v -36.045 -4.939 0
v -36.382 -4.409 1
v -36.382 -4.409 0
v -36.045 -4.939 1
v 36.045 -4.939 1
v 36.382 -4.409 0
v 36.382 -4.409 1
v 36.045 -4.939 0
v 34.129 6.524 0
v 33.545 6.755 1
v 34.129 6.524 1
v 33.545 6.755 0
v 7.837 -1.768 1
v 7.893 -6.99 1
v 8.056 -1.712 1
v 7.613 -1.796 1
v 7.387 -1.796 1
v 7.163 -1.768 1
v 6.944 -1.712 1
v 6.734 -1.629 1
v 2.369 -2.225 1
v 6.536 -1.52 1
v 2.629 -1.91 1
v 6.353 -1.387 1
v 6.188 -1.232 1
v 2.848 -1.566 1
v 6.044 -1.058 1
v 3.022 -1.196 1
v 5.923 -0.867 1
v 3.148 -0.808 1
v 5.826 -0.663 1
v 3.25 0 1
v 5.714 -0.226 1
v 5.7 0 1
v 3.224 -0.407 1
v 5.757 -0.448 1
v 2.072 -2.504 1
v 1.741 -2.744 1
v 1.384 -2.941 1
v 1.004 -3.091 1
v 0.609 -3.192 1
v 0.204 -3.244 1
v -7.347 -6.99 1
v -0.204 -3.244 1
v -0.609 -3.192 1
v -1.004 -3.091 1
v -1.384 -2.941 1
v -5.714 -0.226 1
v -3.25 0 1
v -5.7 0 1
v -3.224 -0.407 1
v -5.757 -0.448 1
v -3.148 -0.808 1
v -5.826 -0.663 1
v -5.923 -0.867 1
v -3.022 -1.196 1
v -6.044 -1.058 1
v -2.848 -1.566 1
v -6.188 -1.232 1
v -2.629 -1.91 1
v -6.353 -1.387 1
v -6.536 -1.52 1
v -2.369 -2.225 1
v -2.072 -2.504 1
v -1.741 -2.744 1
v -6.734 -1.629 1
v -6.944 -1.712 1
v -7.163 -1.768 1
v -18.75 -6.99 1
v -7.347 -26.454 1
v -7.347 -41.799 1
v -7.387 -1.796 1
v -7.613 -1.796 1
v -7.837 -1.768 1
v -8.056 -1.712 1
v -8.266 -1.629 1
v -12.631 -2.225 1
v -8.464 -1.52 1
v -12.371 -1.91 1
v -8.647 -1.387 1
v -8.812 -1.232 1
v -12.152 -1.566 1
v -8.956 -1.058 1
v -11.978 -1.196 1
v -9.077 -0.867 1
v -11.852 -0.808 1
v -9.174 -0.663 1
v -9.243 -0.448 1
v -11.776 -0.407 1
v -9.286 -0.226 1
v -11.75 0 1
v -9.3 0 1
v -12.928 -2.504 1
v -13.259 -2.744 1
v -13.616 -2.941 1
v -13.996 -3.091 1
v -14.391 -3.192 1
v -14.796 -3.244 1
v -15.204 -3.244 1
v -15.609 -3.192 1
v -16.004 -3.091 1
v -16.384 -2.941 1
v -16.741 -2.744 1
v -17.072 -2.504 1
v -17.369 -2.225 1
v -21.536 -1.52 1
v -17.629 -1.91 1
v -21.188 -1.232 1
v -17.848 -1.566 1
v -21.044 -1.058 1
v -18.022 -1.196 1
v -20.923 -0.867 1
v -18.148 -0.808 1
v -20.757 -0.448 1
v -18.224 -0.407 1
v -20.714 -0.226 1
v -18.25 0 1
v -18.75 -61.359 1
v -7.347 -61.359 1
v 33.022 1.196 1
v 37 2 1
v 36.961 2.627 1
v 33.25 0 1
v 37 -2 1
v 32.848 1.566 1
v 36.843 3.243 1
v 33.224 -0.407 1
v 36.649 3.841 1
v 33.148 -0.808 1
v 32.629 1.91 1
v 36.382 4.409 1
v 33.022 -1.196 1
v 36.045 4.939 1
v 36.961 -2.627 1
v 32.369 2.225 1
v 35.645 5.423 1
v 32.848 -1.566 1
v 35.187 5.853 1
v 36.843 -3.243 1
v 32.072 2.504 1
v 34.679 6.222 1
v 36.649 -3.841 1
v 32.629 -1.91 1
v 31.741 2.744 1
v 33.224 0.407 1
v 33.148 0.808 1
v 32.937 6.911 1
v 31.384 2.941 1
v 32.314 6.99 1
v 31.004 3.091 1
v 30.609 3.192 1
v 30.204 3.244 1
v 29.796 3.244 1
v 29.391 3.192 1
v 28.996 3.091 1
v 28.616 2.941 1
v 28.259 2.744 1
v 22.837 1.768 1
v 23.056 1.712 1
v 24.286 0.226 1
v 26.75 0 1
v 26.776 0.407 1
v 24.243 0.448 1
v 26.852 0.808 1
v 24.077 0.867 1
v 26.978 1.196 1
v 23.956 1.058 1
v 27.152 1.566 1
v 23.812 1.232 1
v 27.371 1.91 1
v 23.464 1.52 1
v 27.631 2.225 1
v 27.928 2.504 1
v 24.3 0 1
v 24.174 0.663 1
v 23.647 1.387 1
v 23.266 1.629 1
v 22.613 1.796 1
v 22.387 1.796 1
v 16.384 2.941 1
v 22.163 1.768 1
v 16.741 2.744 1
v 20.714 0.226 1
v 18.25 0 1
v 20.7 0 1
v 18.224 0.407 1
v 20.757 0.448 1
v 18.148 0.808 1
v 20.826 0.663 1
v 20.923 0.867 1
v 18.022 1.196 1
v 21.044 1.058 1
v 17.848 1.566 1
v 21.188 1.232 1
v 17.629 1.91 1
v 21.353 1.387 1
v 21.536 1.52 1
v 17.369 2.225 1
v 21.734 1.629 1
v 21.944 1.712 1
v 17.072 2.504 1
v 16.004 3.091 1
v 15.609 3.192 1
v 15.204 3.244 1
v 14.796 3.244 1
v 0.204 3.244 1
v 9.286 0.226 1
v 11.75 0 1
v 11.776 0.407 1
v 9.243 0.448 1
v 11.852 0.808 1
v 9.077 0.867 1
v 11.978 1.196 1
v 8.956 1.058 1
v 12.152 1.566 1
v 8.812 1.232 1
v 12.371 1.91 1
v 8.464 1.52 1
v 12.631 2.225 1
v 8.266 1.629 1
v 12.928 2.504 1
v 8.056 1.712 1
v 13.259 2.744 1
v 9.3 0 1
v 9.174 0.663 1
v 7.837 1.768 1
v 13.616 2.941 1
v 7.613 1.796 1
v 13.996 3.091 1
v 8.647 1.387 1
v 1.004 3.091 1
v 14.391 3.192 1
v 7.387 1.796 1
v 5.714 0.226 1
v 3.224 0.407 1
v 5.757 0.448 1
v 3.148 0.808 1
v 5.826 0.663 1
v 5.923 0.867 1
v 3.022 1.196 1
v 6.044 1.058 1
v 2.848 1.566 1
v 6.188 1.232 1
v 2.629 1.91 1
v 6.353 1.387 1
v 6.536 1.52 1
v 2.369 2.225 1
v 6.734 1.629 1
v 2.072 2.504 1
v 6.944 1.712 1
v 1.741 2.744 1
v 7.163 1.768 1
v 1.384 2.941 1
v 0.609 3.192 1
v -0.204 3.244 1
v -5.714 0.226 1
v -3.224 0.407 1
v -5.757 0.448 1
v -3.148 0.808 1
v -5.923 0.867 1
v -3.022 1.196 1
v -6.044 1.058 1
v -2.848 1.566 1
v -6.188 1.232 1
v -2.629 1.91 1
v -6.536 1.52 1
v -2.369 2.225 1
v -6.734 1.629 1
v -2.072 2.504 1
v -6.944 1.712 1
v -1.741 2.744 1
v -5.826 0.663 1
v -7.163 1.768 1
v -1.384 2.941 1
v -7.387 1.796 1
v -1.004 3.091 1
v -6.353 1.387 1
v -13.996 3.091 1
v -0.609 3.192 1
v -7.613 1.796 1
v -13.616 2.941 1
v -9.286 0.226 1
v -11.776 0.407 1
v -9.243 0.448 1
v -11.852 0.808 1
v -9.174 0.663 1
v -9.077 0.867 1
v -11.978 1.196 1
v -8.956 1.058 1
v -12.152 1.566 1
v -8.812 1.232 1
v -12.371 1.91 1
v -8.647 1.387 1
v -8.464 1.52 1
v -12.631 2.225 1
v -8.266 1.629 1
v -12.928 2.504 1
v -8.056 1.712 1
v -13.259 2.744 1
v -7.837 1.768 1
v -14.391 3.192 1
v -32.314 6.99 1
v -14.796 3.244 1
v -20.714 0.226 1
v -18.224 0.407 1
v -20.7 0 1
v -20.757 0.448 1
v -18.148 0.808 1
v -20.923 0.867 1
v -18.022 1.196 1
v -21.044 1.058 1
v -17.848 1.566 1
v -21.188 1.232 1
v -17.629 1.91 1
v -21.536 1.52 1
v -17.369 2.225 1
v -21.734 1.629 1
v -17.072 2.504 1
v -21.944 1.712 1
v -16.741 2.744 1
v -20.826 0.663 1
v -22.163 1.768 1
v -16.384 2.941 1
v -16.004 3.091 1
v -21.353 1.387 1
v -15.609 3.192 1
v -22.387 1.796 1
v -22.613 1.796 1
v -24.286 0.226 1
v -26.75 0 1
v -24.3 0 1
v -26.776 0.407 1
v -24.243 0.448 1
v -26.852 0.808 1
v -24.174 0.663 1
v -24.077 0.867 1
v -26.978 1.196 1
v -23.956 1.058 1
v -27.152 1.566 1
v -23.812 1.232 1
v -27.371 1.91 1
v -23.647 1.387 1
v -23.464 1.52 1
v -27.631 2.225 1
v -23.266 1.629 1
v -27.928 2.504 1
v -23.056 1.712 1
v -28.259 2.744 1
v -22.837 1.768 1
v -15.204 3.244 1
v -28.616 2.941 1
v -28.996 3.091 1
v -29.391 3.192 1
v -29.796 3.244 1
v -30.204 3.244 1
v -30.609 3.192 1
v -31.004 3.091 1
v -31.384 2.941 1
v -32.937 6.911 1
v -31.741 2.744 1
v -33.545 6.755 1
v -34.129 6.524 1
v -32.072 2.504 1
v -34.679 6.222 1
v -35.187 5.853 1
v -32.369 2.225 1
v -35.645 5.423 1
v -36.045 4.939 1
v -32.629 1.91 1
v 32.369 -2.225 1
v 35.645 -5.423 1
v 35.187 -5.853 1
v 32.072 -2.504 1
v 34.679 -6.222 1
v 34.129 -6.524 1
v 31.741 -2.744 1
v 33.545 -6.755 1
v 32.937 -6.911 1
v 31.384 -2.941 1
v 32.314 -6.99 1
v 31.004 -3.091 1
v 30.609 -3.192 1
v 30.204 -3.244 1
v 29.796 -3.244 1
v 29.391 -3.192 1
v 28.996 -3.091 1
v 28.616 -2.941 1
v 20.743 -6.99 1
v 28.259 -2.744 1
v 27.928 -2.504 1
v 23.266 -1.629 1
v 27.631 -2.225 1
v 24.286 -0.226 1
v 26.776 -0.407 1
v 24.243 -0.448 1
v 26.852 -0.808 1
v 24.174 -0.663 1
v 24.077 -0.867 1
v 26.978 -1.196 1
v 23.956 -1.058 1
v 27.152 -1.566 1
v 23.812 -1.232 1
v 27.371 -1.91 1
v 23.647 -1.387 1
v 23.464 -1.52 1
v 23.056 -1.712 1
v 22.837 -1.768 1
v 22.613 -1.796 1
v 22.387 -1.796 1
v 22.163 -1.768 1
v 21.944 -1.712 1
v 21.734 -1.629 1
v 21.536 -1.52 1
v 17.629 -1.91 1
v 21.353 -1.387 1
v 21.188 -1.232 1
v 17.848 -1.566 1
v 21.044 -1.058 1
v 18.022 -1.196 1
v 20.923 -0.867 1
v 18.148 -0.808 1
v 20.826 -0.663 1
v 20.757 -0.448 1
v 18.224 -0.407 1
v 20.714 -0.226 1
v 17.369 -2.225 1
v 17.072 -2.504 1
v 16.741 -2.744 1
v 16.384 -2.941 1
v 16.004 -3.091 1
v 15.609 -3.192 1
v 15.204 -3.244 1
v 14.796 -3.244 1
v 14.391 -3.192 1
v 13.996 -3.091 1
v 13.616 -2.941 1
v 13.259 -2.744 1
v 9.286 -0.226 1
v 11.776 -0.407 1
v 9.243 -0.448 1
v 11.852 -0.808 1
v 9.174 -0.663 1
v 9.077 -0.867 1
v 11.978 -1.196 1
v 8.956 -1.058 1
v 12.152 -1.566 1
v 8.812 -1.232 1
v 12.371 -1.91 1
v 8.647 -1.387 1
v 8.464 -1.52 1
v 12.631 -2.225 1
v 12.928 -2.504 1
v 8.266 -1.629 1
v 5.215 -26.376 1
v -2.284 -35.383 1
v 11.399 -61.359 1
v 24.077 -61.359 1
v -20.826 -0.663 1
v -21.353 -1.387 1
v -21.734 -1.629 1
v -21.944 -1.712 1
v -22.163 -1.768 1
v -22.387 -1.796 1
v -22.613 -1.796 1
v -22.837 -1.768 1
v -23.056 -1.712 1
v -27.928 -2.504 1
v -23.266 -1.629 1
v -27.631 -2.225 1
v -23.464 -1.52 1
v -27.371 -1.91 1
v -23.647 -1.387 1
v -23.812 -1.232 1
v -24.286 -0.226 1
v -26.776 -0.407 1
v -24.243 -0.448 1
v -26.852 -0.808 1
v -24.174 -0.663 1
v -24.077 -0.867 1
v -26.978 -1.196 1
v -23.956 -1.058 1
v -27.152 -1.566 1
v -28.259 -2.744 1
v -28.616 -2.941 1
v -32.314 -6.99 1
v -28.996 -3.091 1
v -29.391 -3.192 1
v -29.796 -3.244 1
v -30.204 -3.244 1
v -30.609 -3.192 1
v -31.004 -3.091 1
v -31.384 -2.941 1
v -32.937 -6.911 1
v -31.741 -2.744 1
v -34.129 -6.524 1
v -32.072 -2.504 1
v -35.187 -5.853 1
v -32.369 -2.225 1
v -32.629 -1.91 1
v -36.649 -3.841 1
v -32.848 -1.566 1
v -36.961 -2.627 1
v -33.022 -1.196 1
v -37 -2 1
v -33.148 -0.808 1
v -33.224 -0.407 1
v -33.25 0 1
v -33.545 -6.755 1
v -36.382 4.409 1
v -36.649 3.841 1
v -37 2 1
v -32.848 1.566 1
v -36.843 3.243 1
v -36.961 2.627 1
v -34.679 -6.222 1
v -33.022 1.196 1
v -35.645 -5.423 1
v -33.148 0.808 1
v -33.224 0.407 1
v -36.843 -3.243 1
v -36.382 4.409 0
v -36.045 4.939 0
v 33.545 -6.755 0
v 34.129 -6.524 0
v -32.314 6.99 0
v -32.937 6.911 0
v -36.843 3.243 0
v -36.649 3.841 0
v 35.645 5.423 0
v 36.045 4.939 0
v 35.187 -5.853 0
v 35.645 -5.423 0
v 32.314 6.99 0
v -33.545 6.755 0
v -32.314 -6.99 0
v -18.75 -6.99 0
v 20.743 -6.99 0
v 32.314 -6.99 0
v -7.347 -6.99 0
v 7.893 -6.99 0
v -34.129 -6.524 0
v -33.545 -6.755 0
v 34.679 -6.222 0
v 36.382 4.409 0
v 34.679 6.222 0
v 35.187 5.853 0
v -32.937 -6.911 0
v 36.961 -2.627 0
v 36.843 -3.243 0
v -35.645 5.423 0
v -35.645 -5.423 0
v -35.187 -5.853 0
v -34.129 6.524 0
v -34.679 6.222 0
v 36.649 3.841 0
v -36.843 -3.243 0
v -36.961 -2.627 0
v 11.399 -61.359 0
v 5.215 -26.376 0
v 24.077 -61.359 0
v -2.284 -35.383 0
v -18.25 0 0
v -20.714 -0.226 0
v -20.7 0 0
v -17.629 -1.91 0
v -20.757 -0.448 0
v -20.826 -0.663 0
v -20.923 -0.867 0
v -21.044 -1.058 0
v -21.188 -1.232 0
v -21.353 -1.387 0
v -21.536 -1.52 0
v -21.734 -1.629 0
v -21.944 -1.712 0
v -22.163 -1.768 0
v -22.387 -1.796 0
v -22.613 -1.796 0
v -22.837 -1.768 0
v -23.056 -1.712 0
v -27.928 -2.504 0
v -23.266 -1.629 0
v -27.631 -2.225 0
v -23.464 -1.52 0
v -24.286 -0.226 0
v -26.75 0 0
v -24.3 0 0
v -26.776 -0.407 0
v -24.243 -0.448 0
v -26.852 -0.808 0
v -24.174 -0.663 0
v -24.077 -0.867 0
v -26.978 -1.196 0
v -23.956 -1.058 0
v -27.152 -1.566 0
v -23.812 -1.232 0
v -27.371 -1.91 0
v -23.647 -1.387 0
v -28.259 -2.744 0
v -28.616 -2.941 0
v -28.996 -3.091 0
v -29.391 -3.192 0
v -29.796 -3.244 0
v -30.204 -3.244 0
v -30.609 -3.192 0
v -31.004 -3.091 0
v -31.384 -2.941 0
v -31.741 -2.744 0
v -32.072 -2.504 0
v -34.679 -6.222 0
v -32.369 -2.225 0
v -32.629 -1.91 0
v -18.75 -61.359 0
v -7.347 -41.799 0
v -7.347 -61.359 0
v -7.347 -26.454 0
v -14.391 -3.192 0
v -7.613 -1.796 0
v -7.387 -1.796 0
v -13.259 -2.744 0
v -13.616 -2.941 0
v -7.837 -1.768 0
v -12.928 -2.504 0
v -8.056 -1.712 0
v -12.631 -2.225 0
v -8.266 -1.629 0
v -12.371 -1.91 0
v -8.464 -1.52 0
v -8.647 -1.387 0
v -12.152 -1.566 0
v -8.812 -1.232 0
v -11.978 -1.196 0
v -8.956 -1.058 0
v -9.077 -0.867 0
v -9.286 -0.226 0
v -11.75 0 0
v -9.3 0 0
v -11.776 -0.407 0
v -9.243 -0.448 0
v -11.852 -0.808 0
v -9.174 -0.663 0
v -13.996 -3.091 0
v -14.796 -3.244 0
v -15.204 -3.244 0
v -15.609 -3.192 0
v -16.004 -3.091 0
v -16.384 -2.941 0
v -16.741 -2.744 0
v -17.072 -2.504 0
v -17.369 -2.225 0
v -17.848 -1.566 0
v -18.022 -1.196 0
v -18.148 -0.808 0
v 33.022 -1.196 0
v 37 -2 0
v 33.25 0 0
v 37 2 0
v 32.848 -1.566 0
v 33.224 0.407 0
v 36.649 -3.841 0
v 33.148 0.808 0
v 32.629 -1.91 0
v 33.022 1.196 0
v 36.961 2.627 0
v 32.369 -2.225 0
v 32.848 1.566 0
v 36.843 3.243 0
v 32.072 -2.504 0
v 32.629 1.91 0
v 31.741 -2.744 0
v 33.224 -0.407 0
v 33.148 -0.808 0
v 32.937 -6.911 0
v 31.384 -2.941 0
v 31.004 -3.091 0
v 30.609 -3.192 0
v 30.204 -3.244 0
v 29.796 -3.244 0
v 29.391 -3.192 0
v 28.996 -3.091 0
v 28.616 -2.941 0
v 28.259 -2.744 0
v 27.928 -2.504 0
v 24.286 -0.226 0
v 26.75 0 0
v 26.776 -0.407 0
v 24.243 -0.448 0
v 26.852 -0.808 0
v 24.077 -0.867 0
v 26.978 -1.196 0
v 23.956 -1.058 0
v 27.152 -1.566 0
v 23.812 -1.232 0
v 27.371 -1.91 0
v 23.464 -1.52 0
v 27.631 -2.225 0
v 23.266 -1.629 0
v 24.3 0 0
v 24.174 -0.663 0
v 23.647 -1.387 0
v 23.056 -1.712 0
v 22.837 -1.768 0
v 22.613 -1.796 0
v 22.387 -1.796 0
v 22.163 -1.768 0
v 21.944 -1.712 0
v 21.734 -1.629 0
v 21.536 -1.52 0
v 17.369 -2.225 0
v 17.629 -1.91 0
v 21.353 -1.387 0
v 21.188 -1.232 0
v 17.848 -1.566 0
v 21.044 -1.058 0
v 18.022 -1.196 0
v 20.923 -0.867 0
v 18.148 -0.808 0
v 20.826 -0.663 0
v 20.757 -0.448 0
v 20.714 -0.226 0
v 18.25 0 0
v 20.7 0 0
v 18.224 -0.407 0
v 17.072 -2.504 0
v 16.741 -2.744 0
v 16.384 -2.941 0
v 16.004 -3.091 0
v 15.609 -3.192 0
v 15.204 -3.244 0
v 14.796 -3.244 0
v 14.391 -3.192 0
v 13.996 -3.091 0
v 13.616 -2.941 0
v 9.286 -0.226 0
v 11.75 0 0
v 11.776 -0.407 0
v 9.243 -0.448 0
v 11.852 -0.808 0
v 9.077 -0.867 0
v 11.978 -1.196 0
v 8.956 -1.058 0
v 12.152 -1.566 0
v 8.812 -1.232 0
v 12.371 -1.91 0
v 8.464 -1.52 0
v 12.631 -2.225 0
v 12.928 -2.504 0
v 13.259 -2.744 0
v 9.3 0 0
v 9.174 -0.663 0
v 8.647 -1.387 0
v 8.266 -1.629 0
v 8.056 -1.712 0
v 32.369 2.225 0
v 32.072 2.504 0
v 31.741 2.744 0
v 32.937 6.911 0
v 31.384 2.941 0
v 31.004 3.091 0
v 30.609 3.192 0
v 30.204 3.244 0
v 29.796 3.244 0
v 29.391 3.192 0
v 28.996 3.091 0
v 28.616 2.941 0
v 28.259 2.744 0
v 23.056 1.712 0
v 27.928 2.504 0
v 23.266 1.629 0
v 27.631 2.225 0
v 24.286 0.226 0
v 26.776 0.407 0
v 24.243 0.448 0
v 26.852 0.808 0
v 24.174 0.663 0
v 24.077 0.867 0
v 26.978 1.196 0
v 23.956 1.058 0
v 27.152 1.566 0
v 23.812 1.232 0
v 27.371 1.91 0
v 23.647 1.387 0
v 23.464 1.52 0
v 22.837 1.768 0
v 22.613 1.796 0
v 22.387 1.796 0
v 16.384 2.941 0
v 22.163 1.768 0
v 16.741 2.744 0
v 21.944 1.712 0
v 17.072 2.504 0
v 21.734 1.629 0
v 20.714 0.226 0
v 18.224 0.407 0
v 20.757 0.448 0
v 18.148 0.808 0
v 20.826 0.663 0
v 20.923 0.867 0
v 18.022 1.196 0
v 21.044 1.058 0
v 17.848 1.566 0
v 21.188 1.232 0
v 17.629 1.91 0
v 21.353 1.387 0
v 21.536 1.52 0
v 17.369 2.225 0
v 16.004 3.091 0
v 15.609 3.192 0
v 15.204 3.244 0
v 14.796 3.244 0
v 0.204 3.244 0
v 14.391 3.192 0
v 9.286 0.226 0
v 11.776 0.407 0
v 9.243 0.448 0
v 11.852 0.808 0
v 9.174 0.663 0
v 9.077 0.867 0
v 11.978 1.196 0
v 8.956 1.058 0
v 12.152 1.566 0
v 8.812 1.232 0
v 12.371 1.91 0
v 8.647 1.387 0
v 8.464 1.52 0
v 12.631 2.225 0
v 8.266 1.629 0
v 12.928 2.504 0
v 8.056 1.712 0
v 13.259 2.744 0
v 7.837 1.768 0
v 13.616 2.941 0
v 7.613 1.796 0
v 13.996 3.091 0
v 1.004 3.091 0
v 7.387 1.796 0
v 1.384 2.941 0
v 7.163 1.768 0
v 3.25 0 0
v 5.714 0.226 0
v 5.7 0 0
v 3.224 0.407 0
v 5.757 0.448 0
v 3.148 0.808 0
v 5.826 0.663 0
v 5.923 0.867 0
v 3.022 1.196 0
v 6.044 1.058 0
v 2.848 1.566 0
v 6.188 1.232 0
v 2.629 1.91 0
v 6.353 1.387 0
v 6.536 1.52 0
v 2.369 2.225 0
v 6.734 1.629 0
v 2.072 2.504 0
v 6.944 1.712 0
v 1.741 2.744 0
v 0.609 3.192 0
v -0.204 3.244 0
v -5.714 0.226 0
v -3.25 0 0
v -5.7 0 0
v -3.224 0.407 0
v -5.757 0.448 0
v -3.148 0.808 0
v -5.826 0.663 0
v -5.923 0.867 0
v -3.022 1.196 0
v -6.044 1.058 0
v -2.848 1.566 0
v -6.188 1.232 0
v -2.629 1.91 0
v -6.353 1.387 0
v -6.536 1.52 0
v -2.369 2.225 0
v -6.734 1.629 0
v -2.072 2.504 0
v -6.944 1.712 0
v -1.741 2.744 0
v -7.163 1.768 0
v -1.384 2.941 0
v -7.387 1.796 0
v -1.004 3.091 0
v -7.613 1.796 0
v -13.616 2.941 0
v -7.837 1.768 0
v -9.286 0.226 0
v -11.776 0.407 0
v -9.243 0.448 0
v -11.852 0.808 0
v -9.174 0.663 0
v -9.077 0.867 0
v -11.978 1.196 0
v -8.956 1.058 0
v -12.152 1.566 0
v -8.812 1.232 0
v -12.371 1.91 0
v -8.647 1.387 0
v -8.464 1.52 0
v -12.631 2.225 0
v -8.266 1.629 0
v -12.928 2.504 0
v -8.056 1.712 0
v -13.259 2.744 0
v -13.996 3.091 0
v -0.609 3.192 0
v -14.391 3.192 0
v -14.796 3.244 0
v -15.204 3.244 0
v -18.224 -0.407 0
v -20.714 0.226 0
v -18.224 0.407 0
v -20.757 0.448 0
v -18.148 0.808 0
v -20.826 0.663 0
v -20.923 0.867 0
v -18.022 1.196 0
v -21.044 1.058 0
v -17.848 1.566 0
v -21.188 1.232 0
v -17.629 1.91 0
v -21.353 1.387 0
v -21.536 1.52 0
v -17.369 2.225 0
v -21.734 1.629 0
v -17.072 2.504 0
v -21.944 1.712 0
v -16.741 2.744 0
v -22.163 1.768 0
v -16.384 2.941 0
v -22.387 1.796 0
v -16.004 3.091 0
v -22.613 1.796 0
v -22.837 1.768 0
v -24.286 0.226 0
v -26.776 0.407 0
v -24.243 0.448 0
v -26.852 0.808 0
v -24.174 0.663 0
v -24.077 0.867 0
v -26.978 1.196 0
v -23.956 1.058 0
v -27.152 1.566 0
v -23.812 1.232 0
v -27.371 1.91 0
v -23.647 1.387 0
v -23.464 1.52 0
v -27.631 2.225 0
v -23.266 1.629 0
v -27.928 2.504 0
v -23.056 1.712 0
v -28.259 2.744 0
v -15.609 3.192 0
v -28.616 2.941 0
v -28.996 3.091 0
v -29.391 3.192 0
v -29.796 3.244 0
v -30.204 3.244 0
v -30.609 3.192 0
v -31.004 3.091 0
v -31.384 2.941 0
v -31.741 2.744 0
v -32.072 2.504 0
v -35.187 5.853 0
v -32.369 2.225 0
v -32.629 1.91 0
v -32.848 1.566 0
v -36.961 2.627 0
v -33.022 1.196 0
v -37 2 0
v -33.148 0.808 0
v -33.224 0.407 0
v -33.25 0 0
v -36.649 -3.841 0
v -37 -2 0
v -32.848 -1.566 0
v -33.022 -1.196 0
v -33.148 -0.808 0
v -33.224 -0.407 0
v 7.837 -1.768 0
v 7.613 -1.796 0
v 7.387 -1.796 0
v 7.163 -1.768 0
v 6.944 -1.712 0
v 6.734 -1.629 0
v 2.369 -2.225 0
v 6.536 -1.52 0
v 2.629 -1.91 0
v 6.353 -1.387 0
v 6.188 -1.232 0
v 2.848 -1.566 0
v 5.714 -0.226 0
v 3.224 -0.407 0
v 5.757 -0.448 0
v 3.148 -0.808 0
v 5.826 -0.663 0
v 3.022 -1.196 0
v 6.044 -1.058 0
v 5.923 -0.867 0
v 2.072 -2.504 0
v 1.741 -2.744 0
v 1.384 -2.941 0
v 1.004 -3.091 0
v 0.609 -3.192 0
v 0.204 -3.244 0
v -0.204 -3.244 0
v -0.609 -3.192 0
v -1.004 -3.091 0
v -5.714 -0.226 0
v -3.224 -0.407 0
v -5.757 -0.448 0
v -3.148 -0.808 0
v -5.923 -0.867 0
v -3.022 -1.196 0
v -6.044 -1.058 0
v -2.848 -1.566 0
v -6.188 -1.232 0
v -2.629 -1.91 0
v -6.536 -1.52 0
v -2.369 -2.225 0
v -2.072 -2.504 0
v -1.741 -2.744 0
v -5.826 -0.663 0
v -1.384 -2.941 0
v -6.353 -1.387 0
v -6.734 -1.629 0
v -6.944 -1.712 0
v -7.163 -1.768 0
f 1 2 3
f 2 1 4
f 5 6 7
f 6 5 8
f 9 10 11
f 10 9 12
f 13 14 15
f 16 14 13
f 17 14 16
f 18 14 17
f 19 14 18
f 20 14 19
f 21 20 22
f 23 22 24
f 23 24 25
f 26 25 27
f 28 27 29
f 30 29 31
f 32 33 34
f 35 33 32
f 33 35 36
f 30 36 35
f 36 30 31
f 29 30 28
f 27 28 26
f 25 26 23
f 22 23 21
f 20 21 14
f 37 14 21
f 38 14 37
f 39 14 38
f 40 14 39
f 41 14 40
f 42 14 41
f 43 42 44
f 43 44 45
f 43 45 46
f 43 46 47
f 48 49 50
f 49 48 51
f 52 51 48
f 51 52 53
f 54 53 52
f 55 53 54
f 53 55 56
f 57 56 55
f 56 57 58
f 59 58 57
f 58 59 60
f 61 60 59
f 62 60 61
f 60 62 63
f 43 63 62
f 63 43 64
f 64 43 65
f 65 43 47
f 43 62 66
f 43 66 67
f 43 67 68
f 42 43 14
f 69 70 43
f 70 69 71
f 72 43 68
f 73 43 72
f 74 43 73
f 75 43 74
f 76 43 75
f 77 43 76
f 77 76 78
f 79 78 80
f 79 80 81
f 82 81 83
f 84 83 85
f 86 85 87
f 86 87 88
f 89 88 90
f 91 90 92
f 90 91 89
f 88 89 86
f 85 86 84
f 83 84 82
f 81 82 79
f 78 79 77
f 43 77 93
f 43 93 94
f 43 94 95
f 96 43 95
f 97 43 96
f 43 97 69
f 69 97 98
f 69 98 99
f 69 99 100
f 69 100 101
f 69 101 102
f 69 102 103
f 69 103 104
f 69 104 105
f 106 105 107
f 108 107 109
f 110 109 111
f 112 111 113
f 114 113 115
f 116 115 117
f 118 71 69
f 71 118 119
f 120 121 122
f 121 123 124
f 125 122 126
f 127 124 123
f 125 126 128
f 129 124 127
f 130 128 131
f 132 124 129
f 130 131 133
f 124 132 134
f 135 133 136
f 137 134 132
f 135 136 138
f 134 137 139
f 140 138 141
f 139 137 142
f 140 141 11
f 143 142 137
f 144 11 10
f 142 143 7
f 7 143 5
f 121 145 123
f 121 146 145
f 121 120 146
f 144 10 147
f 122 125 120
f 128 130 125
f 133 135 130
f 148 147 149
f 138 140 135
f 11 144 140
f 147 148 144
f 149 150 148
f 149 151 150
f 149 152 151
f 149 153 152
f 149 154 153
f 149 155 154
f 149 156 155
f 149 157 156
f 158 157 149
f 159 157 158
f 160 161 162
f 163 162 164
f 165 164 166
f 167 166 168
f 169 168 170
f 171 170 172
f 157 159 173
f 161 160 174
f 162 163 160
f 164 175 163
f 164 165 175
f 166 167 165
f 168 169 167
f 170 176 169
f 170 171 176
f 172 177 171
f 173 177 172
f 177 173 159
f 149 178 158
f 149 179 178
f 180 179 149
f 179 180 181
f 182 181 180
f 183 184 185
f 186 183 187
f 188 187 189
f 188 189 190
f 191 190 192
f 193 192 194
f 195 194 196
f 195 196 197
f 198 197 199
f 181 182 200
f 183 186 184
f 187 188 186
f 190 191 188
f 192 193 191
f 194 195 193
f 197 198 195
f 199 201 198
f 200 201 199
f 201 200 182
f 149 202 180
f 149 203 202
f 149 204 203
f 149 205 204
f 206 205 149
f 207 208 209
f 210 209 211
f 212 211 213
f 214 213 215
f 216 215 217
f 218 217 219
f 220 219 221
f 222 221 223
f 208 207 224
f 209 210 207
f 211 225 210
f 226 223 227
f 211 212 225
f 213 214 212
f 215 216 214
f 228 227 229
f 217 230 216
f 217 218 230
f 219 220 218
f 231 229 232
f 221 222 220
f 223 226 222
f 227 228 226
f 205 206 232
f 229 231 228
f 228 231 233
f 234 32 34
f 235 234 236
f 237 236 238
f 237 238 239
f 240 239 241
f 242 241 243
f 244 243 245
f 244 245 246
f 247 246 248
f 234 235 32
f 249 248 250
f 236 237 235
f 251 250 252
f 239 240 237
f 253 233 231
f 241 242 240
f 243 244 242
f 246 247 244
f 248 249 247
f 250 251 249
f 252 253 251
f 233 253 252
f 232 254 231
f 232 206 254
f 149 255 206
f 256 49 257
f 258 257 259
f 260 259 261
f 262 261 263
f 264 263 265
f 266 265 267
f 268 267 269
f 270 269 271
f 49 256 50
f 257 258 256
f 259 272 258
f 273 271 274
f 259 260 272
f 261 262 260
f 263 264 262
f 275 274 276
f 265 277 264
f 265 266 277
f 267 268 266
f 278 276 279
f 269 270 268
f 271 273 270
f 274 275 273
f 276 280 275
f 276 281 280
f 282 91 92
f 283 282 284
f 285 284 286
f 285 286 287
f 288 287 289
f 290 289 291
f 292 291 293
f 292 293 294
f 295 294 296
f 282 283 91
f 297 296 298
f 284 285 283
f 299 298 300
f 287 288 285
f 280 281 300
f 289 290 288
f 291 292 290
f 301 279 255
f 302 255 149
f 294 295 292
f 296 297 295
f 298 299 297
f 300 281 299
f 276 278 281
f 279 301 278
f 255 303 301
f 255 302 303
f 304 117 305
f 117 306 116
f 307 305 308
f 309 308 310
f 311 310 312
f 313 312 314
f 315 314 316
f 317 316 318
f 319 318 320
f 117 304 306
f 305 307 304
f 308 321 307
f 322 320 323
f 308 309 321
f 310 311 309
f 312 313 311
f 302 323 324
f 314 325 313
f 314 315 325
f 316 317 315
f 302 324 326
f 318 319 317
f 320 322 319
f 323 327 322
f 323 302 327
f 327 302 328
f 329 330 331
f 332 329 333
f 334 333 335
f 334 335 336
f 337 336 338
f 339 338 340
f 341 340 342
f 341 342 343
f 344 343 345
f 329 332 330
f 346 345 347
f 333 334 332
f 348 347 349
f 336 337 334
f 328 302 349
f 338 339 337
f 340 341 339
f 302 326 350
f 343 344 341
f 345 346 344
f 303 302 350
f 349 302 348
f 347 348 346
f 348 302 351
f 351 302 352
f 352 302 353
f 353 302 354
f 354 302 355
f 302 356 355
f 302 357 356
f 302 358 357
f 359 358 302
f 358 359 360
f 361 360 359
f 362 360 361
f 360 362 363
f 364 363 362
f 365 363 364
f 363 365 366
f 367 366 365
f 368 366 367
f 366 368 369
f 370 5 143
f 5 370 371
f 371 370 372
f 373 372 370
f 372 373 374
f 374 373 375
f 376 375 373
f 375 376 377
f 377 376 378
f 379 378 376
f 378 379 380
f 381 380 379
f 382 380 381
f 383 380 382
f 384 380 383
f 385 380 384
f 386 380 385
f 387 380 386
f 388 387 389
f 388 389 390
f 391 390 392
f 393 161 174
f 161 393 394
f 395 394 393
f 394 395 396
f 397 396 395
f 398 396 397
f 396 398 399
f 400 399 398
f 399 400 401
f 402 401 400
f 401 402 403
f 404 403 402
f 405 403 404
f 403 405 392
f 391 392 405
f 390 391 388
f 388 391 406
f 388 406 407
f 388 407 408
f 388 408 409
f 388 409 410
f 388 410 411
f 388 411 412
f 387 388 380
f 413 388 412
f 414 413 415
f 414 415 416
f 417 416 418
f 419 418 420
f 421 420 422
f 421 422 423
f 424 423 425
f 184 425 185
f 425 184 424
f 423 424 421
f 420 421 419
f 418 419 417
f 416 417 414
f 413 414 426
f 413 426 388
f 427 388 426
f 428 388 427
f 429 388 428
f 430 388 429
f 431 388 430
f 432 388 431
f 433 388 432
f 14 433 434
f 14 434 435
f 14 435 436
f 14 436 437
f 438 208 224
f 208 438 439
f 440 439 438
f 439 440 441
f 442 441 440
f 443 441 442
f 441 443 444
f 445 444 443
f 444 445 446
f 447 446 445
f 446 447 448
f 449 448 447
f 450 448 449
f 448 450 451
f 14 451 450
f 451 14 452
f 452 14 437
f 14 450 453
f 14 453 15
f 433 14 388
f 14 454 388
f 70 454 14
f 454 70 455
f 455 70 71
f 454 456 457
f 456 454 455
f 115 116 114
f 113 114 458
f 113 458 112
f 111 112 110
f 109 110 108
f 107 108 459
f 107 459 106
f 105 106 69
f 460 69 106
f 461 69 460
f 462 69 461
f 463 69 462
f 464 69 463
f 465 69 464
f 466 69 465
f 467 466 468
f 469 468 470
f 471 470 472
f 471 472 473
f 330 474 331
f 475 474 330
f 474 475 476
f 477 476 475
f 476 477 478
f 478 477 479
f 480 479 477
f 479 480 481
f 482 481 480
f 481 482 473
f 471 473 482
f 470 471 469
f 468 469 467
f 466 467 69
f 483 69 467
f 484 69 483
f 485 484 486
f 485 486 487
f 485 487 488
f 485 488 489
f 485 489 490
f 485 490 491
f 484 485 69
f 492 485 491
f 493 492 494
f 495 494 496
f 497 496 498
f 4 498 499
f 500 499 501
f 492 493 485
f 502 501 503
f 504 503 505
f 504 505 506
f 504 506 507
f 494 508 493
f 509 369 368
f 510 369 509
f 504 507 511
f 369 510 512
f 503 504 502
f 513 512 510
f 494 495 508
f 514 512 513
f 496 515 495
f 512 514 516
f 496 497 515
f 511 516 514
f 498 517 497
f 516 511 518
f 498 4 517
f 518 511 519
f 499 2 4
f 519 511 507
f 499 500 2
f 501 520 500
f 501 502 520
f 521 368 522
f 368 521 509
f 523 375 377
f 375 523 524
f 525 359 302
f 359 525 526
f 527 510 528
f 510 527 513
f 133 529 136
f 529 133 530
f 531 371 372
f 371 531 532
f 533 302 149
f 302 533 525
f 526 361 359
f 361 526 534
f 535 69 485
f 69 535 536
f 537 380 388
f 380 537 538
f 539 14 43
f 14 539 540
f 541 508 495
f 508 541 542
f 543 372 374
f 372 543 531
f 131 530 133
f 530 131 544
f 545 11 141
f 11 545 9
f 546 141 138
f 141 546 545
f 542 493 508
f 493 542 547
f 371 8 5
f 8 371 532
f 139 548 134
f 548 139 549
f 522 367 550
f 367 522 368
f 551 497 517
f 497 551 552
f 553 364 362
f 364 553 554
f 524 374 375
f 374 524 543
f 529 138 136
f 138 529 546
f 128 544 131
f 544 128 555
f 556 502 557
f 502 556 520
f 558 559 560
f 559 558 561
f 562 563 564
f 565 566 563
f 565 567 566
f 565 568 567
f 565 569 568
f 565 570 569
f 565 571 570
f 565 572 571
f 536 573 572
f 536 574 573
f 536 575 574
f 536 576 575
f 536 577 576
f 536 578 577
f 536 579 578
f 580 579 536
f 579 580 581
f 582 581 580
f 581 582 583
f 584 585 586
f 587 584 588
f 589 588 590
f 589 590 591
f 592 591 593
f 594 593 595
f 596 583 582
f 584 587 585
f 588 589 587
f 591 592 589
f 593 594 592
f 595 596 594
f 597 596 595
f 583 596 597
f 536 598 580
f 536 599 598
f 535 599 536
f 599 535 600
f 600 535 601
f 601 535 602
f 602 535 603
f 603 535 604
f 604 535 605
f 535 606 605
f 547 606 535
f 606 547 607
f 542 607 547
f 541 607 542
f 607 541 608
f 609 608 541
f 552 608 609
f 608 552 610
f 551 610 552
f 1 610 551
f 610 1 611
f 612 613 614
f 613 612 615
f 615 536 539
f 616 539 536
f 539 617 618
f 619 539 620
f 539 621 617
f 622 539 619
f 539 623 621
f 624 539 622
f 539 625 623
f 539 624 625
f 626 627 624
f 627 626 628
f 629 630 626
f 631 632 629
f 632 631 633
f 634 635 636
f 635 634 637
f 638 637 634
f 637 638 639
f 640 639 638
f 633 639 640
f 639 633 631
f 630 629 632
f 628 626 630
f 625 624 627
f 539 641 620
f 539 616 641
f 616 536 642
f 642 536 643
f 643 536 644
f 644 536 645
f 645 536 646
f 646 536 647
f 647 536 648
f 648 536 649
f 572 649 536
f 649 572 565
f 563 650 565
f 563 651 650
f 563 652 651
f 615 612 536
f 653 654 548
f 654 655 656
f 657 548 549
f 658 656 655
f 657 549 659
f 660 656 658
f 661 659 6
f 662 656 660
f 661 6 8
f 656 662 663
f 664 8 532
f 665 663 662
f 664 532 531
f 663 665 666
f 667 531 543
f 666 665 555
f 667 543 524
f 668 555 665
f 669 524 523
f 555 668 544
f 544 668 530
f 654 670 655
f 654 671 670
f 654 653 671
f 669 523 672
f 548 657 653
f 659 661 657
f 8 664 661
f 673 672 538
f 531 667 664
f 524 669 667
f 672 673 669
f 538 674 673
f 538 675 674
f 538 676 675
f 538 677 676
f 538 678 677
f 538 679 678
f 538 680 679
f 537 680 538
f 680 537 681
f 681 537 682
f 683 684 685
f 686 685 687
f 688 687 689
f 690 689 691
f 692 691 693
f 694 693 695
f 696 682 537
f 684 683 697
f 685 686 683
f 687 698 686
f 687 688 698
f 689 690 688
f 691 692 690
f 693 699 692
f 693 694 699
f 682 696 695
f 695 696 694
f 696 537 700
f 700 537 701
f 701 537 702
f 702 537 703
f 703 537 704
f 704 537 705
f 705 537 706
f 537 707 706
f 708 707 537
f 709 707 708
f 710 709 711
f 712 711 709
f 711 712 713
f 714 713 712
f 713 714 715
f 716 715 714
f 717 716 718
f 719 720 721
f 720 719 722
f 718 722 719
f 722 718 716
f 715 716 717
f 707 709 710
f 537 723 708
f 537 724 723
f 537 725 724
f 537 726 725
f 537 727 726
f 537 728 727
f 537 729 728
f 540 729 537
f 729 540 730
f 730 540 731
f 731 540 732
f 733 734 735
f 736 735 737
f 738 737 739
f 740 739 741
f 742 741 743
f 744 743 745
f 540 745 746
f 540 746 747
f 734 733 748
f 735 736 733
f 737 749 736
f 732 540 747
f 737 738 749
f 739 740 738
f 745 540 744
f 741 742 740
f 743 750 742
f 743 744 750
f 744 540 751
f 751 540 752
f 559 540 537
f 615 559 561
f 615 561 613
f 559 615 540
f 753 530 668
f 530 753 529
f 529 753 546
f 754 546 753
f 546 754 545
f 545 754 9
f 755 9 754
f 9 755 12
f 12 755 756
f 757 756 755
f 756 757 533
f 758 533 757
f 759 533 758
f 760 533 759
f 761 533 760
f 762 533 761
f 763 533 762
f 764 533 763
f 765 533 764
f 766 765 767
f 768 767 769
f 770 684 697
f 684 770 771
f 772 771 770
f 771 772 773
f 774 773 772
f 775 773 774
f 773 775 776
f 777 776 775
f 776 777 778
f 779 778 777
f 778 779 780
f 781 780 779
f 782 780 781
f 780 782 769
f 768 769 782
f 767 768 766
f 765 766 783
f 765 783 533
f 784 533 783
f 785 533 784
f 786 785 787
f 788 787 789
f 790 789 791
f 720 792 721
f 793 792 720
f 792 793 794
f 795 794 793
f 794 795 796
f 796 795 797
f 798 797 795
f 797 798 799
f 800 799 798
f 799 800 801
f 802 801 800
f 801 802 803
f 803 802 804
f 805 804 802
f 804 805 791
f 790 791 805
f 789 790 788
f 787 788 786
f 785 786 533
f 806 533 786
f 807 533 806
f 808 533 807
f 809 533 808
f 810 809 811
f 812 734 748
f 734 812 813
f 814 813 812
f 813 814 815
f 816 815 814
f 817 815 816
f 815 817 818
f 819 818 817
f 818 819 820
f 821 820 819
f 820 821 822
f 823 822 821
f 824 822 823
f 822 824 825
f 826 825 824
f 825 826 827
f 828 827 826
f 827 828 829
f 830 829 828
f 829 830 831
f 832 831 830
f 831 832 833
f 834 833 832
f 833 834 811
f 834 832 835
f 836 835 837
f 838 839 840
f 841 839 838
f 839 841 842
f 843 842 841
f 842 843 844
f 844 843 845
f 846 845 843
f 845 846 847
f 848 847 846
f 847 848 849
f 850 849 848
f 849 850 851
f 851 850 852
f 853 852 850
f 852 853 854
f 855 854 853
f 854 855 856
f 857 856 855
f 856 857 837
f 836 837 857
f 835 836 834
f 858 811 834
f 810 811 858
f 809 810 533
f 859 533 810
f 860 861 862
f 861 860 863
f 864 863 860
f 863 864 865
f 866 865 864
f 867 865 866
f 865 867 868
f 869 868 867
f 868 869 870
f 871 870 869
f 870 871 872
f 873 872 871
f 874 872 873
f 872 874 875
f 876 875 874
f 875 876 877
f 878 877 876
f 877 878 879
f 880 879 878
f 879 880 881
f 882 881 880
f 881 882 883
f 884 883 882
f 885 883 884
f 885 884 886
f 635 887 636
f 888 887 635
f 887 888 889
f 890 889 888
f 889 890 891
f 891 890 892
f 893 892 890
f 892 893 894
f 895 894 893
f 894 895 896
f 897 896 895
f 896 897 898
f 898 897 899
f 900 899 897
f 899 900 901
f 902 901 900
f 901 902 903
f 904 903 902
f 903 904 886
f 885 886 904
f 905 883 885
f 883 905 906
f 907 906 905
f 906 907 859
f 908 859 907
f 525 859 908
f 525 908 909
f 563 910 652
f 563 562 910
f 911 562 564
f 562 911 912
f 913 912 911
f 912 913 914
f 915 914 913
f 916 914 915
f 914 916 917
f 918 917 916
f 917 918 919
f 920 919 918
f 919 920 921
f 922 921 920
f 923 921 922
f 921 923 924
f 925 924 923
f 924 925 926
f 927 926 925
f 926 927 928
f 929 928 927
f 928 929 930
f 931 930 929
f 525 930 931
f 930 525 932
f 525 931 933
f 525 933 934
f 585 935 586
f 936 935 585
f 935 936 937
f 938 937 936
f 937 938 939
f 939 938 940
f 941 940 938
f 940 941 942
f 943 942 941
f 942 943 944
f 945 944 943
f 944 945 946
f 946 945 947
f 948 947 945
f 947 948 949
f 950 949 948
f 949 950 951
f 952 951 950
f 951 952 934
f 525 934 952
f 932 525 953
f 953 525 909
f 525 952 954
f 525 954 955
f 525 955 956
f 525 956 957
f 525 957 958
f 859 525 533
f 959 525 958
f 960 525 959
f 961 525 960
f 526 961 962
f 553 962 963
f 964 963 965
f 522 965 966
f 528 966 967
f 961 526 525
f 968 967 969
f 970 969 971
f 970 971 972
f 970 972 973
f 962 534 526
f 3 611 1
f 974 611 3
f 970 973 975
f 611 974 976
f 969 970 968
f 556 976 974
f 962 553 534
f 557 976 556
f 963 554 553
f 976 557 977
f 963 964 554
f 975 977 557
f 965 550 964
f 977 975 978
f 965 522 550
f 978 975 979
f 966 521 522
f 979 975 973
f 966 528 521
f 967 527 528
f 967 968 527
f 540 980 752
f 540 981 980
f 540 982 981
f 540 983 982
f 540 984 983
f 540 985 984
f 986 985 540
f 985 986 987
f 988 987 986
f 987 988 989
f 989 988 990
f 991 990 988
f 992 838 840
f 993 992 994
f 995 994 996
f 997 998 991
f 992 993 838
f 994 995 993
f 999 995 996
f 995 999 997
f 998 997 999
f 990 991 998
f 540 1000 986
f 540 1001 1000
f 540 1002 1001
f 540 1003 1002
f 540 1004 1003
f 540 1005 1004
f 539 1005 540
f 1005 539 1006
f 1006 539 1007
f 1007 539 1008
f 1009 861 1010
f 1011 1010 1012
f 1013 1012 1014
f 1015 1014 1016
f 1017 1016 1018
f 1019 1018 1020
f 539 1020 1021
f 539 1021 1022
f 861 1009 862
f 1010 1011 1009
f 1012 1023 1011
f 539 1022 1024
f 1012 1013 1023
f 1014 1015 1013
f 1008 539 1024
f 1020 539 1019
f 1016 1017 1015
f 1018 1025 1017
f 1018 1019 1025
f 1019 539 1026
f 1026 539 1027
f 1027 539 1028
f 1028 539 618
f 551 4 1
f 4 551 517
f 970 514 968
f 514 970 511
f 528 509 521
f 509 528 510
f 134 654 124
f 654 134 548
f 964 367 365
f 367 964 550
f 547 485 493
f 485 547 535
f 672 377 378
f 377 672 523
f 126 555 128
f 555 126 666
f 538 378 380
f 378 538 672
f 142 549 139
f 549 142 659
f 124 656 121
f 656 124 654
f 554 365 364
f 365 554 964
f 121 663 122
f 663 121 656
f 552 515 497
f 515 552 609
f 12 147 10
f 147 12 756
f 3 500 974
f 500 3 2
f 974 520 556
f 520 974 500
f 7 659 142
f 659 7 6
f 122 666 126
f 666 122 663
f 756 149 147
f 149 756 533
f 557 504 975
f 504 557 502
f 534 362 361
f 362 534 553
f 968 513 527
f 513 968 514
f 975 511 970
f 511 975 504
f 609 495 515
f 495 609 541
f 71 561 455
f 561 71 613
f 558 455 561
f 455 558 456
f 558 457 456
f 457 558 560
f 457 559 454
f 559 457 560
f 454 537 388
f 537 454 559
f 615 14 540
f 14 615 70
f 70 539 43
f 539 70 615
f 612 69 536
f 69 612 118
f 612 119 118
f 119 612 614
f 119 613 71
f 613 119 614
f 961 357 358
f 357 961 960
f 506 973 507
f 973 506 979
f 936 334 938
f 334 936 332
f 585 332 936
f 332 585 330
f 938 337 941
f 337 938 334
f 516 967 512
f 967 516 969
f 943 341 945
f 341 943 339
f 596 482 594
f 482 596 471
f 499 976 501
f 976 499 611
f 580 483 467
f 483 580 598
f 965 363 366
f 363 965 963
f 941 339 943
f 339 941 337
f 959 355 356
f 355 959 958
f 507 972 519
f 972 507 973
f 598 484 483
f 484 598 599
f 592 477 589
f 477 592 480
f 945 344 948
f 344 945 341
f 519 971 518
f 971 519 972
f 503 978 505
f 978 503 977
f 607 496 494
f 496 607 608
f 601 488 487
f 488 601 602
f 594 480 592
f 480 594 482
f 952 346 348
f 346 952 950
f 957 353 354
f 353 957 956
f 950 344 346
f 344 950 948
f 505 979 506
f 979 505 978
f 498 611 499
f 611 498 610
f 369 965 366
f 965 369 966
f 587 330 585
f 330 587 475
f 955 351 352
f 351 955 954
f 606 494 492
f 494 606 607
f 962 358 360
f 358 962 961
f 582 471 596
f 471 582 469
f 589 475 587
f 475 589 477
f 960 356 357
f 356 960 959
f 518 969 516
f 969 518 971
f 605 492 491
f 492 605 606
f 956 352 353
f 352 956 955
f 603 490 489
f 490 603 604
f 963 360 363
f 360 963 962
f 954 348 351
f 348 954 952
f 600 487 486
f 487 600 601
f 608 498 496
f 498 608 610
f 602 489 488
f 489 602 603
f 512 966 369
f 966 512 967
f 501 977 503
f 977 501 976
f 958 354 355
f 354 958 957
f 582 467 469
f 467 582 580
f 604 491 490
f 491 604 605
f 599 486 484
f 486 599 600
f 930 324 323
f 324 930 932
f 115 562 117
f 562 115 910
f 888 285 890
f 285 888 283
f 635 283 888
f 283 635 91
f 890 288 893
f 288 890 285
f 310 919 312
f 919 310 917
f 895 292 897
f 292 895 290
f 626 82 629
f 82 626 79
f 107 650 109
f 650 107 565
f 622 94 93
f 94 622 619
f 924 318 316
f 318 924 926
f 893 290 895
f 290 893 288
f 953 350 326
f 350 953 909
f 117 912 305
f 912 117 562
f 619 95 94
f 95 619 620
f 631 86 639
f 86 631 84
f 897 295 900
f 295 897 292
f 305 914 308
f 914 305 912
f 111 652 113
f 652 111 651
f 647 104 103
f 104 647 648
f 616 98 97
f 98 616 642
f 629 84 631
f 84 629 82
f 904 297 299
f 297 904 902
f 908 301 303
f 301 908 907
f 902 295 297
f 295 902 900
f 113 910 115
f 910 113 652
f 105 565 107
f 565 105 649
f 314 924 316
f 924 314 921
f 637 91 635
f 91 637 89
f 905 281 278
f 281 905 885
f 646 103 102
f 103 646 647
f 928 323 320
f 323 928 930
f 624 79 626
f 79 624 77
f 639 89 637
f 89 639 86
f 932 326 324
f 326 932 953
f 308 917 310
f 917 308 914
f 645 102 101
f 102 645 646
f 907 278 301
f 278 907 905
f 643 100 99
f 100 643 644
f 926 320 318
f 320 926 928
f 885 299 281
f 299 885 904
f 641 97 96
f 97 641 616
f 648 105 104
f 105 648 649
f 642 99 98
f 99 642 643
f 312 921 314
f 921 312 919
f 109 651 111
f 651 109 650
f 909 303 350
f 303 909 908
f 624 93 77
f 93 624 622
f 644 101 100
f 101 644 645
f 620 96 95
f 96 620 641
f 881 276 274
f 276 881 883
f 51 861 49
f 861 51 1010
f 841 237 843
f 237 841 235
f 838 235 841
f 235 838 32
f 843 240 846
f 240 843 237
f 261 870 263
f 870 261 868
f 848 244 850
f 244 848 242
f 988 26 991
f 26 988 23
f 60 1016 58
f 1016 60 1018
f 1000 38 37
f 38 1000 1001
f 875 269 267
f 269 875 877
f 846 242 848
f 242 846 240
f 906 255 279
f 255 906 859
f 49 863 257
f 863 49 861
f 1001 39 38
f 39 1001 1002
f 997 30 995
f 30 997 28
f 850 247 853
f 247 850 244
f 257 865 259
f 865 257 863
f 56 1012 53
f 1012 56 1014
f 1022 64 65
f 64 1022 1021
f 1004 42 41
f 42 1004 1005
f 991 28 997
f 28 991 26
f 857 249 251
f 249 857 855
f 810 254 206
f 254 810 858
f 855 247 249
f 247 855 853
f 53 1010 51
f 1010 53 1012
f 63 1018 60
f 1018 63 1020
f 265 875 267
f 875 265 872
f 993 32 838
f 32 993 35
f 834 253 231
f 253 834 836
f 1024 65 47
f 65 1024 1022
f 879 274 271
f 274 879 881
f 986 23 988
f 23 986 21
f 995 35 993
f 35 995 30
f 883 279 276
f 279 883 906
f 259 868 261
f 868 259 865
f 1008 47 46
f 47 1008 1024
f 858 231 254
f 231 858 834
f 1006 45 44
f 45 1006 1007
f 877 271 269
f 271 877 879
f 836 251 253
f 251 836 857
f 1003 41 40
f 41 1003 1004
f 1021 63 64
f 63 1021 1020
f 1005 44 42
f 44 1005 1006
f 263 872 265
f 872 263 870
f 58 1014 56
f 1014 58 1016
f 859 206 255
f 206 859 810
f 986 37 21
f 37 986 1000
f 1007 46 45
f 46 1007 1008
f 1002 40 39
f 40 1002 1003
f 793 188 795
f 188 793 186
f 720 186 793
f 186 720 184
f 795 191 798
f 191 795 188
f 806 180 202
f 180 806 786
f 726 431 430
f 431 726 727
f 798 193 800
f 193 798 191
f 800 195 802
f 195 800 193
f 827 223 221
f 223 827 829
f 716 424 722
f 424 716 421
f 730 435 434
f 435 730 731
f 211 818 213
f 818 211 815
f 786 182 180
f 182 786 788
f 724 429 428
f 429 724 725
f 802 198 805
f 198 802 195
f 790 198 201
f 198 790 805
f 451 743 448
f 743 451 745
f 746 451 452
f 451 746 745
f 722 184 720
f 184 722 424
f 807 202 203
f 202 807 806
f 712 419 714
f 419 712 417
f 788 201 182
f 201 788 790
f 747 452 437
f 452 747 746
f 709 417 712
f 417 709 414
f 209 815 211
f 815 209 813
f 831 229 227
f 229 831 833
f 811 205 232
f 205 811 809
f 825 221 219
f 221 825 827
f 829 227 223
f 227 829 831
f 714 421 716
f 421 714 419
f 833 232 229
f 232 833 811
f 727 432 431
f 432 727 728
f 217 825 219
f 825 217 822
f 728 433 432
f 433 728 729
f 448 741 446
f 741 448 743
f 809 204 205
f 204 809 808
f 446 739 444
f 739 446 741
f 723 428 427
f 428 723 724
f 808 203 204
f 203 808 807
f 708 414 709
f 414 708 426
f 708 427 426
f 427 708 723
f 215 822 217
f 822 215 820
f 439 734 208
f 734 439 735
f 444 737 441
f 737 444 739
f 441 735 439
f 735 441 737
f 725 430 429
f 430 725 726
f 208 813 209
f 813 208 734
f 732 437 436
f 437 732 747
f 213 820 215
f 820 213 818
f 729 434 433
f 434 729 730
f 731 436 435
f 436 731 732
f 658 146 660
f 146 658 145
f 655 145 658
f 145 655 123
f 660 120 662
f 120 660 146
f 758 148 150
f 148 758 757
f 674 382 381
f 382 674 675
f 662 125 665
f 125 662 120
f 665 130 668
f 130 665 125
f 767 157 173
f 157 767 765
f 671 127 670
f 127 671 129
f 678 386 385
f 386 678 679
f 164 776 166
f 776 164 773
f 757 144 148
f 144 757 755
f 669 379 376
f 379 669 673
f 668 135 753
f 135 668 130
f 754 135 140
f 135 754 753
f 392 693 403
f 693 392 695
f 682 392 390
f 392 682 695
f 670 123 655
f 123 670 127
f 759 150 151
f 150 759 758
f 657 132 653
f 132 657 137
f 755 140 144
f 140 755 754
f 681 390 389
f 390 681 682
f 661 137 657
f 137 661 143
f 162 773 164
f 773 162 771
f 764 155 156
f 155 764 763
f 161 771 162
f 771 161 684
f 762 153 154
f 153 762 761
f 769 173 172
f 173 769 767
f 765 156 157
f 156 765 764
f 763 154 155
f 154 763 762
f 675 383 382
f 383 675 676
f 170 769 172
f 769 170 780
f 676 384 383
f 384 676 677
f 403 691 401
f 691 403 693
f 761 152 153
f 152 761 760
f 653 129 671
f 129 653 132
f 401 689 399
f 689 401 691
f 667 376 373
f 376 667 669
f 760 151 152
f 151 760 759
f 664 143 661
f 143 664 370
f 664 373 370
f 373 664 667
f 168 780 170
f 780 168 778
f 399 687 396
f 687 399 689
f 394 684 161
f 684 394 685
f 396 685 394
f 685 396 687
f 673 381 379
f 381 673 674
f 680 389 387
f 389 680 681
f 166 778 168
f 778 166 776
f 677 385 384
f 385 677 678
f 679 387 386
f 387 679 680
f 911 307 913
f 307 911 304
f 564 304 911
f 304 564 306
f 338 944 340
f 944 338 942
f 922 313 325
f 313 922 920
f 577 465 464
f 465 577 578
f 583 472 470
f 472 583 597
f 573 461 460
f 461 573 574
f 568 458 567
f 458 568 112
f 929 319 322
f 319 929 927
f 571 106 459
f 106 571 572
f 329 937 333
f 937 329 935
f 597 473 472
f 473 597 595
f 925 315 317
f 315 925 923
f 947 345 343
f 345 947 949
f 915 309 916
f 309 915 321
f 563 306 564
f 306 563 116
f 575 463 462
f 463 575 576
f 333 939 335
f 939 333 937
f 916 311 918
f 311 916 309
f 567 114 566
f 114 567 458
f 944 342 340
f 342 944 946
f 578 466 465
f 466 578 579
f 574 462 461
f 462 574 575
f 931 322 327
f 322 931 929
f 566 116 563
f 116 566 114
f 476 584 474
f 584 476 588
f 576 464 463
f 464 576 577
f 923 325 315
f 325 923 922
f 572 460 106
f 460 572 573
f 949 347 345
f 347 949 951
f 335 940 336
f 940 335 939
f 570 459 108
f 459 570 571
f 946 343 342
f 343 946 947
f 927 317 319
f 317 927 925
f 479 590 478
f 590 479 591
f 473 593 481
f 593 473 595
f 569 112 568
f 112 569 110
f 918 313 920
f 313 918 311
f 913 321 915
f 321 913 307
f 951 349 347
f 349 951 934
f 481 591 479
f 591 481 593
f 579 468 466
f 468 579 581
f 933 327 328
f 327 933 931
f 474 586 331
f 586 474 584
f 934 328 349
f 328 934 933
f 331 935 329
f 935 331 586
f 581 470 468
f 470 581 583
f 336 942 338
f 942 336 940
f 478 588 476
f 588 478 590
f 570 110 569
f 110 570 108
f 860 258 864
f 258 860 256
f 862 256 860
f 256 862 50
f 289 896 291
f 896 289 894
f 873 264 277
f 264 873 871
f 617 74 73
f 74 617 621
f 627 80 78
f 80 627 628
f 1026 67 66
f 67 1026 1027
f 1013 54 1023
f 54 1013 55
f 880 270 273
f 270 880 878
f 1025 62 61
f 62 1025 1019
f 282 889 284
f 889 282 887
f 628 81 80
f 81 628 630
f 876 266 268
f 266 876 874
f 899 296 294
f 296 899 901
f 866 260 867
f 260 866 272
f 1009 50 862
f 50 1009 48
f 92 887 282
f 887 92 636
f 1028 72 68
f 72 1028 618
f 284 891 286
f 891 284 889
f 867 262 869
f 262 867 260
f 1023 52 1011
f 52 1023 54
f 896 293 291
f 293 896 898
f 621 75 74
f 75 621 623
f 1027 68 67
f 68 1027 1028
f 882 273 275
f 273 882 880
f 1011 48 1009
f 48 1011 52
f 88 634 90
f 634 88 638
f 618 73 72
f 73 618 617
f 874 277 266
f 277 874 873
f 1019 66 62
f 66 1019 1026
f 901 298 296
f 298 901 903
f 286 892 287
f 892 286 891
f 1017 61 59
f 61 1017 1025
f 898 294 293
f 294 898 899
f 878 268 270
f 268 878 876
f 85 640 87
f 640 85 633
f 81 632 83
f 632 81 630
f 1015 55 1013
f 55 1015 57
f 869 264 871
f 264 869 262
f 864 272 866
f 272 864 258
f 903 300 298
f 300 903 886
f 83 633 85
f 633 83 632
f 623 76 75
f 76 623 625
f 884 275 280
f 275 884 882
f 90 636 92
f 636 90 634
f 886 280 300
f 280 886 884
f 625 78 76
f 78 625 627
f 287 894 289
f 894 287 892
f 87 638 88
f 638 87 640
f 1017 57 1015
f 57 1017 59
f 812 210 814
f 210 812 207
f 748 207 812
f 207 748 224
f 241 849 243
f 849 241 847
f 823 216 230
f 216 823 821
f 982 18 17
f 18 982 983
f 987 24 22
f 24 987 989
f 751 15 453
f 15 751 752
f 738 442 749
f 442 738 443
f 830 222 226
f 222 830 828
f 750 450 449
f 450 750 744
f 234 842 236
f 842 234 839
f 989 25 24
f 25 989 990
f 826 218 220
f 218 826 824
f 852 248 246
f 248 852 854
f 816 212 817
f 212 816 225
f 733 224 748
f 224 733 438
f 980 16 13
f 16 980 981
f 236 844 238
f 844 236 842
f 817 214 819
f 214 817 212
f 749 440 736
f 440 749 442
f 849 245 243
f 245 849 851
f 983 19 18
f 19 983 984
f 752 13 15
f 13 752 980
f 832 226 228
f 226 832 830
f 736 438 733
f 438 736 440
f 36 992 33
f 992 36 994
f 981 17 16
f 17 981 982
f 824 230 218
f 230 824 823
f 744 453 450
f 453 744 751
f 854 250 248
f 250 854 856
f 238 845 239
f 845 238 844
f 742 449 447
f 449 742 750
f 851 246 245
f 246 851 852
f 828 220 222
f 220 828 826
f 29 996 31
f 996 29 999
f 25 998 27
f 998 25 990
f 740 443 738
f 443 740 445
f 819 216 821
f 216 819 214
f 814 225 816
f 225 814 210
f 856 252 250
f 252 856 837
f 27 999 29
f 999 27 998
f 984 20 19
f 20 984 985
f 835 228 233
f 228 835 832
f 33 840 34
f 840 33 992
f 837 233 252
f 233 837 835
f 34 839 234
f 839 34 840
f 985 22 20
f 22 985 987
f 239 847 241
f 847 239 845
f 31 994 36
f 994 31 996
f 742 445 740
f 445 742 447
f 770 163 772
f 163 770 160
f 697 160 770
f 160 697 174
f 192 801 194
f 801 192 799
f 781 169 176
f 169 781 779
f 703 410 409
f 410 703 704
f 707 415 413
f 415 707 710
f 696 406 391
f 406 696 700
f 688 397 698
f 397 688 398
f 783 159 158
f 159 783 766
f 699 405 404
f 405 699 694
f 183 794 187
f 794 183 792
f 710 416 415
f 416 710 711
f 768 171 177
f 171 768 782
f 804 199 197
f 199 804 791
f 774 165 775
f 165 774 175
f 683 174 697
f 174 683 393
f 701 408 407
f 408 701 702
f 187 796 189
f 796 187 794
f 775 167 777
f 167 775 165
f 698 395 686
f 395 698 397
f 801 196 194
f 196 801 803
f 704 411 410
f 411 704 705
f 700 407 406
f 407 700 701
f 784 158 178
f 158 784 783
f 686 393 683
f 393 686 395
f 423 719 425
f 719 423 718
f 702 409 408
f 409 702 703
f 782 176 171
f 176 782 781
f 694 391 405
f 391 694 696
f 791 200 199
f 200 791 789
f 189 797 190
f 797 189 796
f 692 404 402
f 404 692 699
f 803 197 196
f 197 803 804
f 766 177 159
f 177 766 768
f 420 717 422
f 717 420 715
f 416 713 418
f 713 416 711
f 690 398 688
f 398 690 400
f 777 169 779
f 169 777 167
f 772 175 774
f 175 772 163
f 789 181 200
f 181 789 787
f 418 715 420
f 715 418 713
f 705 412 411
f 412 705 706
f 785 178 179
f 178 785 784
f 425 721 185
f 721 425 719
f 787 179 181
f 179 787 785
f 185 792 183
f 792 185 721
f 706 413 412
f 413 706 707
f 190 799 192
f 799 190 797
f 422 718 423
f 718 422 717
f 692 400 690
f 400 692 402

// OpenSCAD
$fn = 50;


difference() {
	union() {
		*color(alpha = 1.0000000000, c = "gray") {
			translate(v = [0, 14, 0]) {
				linear_extrude(height = 1) {
					text(font = "Arial:style=Bold", halign = "center", size = 4.5000000000, text = "COMMENT description oobb_plate_shape_p_type_1_depth_5_width_1_thickness_k_extra_oobb_size", valign = "center");
				}
			}
		}
		hull() {
			translate(v = [-32.0000000000, 2.0000000000, 0]) {
				cylinder(h = 1, r = 5);
			}
			translate(v = [32.0000000000, 2.0000000000, 0]) {
				cylinder(h = 1, r = 5);
			}
			translate(v = [-32.0000000000, -2.0000000000, 0]) {
				cylinder(h = 1, r = 5);
			}
			translate(v = [32.0000000000, -2.0000000000, 0]) {
				cylinder(h = 1, r = 5);
			}
		}
		translate(v = [0, -5, 0]) {
			linear_extrude(height = 1) {
				text(font = "DejaVu Sans Mono:style=Bold", halign = "center", size = 57.0000000000, text = "K", valign = "top");
			}
		}
	}
	union() {
		*color(alpha = 1.0000000000, c = "gray") {
			translate(v = [0, 14, 0]) {
				linear_extrude(height = 1) {
					text(font = "Arial:style=Bold", halign = "center", size = 4.5000000000, text = "COMMENT description oobb_holes_shape_n_type_5_width_1_thickness_k_extra_oobb_size_1_height_'all'_holes_true_both_holes", valign = "center");
				}
			}
		}
		translate(v = [-30.0000000000, 0.0000000000, 0]) {
			translate(v = [0, 0, -50]) {
				cylinder(h = 100, r = 3.2500000000);
			}
		}
		translate(v = [-15.0000000000, 0.0000000000, 0]) {
			translate(v = [0, 0, -50]) {
				cylinder(h = 100, r = 3.2500000000);
			}
		}
		translate(v = [0, 0, -50]) {
			cylinder(h = 100, r = 3.2500000000);
		}
		translate(v = [15.0000000000, 0.0000000000, 0]) {
			translate(v = [0, 0, -50]) {
				cylinder(h = 100, r = 3.2500000000);
			}
		}
		translate(v = [30.0000000000, 0.0000000000, 0]) {
			translate(v = [0, 0, -50]) {
				cylinder(h = 100, r = 3.2500000000);
			}
		}
		translate(v = [-30.0000000000, 0.0000000000, 0]) {
			translate(v = [0, 0, -50]) {
				cylinder(h = 100, r = 1.8000000000);
			}
		}
		translate(v = [-22.5000000000, 0.0000000000, 0]) {
			translate(v = [0, 0, -50]) {
				cylinder(h = 100, r = 1.8000000000);
			}
		}
		translate(v = [-15.0000000000, 0.0000000000, 0]) {
			translate(v = [0, 0, -50]) {
				cylinder(h = 100, r = 1.8000000000);
			}
		}
		translate(v = [-7.5000000000, 0.0000000000, 0]) {
			translate(v = [0, 0, -50]) {
				cylinder(h = 100, r = 1.8000000000);
			}
		}
		translate(v = [0, 0, -50]) {
			cylinder(h = 100, r = 1.8000000000);
		}
		translate(v = [7.5000000000, 0.0000000000, 0]) {
			translate(v = [0, 0, -50]) {
				cylinder(h = 100, r = 1.8000000000);
			}
		}
		translate(v = [15.0000000000, 0.0000000000, 0]) {
			translate(v = [0, 0, -50]) {
				cylinder(h = 100, r = 1.8000000000);
			}
		}
		translate(v = [22.5000000000, 0.0000000000, 0]) {
			translate(v = [0, 0, -50]) {
				cylinder(h = 100, r = 1.8000000000);
			}
		}
		translate(v = [30.0000000000, 0.0000000000, 0]) {
			translate(v = [0, 0, -50]) {
				cylinder(h = 100, r = 1.8000000000);
			}
		}
	}
}
